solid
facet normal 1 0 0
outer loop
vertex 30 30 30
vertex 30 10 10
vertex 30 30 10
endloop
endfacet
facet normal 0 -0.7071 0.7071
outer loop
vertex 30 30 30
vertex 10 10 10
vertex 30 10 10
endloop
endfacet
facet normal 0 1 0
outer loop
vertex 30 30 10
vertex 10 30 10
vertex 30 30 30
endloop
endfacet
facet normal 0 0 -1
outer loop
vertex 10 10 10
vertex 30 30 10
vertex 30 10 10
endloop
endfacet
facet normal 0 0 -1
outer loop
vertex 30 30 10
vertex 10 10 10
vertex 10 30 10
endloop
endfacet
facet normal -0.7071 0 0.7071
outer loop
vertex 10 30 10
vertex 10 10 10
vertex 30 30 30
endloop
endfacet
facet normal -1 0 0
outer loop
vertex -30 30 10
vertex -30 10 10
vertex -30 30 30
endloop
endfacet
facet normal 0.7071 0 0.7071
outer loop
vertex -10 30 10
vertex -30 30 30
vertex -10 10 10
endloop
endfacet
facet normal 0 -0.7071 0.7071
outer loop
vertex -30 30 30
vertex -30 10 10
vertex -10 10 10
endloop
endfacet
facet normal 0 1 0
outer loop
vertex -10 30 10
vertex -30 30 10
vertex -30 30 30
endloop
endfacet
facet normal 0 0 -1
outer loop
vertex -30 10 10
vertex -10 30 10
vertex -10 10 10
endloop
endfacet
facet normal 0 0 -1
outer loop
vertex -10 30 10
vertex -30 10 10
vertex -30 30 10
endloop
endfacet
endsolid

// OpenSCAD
// Unit of length: Unit.MM
union()
{
   translate(v = [10.0, 10.0, 10.0])
   {
      polyhedron(points = [[20.0, 20.0, 0.0], [20.0, 0.0, 0.0], [0.0, 0.0, 0.0], [0.0, 20.0, 0.0], [20.0, 20.0, 20.0]], faces = [[0, 1, 4], [1, 2, 4], [2, 3, 4], [3, 0, 4], [1, 0, 3], [2, 1, 3]], convexity = 1);
   }
   mirror(v = [1.0, 0.0, 0.0])
   {
      translate(v = [10.0, 10.0, 10.0])
      {
         polyhedron(points = [[20.0, 20.0, 0.0], [20.0, 0.0, 0.0], [0.0, 0.0, 0.0], [0.0, 20.0, 0.0], [20.0, 20.0, 20.0]], faces = [[0, 1, 4], [1, 2, 4], [2, 3, 4], [3, 0, 4], [1, 0, 3], [2, 1, 3]], convexity = 1);
      }
   }
}
